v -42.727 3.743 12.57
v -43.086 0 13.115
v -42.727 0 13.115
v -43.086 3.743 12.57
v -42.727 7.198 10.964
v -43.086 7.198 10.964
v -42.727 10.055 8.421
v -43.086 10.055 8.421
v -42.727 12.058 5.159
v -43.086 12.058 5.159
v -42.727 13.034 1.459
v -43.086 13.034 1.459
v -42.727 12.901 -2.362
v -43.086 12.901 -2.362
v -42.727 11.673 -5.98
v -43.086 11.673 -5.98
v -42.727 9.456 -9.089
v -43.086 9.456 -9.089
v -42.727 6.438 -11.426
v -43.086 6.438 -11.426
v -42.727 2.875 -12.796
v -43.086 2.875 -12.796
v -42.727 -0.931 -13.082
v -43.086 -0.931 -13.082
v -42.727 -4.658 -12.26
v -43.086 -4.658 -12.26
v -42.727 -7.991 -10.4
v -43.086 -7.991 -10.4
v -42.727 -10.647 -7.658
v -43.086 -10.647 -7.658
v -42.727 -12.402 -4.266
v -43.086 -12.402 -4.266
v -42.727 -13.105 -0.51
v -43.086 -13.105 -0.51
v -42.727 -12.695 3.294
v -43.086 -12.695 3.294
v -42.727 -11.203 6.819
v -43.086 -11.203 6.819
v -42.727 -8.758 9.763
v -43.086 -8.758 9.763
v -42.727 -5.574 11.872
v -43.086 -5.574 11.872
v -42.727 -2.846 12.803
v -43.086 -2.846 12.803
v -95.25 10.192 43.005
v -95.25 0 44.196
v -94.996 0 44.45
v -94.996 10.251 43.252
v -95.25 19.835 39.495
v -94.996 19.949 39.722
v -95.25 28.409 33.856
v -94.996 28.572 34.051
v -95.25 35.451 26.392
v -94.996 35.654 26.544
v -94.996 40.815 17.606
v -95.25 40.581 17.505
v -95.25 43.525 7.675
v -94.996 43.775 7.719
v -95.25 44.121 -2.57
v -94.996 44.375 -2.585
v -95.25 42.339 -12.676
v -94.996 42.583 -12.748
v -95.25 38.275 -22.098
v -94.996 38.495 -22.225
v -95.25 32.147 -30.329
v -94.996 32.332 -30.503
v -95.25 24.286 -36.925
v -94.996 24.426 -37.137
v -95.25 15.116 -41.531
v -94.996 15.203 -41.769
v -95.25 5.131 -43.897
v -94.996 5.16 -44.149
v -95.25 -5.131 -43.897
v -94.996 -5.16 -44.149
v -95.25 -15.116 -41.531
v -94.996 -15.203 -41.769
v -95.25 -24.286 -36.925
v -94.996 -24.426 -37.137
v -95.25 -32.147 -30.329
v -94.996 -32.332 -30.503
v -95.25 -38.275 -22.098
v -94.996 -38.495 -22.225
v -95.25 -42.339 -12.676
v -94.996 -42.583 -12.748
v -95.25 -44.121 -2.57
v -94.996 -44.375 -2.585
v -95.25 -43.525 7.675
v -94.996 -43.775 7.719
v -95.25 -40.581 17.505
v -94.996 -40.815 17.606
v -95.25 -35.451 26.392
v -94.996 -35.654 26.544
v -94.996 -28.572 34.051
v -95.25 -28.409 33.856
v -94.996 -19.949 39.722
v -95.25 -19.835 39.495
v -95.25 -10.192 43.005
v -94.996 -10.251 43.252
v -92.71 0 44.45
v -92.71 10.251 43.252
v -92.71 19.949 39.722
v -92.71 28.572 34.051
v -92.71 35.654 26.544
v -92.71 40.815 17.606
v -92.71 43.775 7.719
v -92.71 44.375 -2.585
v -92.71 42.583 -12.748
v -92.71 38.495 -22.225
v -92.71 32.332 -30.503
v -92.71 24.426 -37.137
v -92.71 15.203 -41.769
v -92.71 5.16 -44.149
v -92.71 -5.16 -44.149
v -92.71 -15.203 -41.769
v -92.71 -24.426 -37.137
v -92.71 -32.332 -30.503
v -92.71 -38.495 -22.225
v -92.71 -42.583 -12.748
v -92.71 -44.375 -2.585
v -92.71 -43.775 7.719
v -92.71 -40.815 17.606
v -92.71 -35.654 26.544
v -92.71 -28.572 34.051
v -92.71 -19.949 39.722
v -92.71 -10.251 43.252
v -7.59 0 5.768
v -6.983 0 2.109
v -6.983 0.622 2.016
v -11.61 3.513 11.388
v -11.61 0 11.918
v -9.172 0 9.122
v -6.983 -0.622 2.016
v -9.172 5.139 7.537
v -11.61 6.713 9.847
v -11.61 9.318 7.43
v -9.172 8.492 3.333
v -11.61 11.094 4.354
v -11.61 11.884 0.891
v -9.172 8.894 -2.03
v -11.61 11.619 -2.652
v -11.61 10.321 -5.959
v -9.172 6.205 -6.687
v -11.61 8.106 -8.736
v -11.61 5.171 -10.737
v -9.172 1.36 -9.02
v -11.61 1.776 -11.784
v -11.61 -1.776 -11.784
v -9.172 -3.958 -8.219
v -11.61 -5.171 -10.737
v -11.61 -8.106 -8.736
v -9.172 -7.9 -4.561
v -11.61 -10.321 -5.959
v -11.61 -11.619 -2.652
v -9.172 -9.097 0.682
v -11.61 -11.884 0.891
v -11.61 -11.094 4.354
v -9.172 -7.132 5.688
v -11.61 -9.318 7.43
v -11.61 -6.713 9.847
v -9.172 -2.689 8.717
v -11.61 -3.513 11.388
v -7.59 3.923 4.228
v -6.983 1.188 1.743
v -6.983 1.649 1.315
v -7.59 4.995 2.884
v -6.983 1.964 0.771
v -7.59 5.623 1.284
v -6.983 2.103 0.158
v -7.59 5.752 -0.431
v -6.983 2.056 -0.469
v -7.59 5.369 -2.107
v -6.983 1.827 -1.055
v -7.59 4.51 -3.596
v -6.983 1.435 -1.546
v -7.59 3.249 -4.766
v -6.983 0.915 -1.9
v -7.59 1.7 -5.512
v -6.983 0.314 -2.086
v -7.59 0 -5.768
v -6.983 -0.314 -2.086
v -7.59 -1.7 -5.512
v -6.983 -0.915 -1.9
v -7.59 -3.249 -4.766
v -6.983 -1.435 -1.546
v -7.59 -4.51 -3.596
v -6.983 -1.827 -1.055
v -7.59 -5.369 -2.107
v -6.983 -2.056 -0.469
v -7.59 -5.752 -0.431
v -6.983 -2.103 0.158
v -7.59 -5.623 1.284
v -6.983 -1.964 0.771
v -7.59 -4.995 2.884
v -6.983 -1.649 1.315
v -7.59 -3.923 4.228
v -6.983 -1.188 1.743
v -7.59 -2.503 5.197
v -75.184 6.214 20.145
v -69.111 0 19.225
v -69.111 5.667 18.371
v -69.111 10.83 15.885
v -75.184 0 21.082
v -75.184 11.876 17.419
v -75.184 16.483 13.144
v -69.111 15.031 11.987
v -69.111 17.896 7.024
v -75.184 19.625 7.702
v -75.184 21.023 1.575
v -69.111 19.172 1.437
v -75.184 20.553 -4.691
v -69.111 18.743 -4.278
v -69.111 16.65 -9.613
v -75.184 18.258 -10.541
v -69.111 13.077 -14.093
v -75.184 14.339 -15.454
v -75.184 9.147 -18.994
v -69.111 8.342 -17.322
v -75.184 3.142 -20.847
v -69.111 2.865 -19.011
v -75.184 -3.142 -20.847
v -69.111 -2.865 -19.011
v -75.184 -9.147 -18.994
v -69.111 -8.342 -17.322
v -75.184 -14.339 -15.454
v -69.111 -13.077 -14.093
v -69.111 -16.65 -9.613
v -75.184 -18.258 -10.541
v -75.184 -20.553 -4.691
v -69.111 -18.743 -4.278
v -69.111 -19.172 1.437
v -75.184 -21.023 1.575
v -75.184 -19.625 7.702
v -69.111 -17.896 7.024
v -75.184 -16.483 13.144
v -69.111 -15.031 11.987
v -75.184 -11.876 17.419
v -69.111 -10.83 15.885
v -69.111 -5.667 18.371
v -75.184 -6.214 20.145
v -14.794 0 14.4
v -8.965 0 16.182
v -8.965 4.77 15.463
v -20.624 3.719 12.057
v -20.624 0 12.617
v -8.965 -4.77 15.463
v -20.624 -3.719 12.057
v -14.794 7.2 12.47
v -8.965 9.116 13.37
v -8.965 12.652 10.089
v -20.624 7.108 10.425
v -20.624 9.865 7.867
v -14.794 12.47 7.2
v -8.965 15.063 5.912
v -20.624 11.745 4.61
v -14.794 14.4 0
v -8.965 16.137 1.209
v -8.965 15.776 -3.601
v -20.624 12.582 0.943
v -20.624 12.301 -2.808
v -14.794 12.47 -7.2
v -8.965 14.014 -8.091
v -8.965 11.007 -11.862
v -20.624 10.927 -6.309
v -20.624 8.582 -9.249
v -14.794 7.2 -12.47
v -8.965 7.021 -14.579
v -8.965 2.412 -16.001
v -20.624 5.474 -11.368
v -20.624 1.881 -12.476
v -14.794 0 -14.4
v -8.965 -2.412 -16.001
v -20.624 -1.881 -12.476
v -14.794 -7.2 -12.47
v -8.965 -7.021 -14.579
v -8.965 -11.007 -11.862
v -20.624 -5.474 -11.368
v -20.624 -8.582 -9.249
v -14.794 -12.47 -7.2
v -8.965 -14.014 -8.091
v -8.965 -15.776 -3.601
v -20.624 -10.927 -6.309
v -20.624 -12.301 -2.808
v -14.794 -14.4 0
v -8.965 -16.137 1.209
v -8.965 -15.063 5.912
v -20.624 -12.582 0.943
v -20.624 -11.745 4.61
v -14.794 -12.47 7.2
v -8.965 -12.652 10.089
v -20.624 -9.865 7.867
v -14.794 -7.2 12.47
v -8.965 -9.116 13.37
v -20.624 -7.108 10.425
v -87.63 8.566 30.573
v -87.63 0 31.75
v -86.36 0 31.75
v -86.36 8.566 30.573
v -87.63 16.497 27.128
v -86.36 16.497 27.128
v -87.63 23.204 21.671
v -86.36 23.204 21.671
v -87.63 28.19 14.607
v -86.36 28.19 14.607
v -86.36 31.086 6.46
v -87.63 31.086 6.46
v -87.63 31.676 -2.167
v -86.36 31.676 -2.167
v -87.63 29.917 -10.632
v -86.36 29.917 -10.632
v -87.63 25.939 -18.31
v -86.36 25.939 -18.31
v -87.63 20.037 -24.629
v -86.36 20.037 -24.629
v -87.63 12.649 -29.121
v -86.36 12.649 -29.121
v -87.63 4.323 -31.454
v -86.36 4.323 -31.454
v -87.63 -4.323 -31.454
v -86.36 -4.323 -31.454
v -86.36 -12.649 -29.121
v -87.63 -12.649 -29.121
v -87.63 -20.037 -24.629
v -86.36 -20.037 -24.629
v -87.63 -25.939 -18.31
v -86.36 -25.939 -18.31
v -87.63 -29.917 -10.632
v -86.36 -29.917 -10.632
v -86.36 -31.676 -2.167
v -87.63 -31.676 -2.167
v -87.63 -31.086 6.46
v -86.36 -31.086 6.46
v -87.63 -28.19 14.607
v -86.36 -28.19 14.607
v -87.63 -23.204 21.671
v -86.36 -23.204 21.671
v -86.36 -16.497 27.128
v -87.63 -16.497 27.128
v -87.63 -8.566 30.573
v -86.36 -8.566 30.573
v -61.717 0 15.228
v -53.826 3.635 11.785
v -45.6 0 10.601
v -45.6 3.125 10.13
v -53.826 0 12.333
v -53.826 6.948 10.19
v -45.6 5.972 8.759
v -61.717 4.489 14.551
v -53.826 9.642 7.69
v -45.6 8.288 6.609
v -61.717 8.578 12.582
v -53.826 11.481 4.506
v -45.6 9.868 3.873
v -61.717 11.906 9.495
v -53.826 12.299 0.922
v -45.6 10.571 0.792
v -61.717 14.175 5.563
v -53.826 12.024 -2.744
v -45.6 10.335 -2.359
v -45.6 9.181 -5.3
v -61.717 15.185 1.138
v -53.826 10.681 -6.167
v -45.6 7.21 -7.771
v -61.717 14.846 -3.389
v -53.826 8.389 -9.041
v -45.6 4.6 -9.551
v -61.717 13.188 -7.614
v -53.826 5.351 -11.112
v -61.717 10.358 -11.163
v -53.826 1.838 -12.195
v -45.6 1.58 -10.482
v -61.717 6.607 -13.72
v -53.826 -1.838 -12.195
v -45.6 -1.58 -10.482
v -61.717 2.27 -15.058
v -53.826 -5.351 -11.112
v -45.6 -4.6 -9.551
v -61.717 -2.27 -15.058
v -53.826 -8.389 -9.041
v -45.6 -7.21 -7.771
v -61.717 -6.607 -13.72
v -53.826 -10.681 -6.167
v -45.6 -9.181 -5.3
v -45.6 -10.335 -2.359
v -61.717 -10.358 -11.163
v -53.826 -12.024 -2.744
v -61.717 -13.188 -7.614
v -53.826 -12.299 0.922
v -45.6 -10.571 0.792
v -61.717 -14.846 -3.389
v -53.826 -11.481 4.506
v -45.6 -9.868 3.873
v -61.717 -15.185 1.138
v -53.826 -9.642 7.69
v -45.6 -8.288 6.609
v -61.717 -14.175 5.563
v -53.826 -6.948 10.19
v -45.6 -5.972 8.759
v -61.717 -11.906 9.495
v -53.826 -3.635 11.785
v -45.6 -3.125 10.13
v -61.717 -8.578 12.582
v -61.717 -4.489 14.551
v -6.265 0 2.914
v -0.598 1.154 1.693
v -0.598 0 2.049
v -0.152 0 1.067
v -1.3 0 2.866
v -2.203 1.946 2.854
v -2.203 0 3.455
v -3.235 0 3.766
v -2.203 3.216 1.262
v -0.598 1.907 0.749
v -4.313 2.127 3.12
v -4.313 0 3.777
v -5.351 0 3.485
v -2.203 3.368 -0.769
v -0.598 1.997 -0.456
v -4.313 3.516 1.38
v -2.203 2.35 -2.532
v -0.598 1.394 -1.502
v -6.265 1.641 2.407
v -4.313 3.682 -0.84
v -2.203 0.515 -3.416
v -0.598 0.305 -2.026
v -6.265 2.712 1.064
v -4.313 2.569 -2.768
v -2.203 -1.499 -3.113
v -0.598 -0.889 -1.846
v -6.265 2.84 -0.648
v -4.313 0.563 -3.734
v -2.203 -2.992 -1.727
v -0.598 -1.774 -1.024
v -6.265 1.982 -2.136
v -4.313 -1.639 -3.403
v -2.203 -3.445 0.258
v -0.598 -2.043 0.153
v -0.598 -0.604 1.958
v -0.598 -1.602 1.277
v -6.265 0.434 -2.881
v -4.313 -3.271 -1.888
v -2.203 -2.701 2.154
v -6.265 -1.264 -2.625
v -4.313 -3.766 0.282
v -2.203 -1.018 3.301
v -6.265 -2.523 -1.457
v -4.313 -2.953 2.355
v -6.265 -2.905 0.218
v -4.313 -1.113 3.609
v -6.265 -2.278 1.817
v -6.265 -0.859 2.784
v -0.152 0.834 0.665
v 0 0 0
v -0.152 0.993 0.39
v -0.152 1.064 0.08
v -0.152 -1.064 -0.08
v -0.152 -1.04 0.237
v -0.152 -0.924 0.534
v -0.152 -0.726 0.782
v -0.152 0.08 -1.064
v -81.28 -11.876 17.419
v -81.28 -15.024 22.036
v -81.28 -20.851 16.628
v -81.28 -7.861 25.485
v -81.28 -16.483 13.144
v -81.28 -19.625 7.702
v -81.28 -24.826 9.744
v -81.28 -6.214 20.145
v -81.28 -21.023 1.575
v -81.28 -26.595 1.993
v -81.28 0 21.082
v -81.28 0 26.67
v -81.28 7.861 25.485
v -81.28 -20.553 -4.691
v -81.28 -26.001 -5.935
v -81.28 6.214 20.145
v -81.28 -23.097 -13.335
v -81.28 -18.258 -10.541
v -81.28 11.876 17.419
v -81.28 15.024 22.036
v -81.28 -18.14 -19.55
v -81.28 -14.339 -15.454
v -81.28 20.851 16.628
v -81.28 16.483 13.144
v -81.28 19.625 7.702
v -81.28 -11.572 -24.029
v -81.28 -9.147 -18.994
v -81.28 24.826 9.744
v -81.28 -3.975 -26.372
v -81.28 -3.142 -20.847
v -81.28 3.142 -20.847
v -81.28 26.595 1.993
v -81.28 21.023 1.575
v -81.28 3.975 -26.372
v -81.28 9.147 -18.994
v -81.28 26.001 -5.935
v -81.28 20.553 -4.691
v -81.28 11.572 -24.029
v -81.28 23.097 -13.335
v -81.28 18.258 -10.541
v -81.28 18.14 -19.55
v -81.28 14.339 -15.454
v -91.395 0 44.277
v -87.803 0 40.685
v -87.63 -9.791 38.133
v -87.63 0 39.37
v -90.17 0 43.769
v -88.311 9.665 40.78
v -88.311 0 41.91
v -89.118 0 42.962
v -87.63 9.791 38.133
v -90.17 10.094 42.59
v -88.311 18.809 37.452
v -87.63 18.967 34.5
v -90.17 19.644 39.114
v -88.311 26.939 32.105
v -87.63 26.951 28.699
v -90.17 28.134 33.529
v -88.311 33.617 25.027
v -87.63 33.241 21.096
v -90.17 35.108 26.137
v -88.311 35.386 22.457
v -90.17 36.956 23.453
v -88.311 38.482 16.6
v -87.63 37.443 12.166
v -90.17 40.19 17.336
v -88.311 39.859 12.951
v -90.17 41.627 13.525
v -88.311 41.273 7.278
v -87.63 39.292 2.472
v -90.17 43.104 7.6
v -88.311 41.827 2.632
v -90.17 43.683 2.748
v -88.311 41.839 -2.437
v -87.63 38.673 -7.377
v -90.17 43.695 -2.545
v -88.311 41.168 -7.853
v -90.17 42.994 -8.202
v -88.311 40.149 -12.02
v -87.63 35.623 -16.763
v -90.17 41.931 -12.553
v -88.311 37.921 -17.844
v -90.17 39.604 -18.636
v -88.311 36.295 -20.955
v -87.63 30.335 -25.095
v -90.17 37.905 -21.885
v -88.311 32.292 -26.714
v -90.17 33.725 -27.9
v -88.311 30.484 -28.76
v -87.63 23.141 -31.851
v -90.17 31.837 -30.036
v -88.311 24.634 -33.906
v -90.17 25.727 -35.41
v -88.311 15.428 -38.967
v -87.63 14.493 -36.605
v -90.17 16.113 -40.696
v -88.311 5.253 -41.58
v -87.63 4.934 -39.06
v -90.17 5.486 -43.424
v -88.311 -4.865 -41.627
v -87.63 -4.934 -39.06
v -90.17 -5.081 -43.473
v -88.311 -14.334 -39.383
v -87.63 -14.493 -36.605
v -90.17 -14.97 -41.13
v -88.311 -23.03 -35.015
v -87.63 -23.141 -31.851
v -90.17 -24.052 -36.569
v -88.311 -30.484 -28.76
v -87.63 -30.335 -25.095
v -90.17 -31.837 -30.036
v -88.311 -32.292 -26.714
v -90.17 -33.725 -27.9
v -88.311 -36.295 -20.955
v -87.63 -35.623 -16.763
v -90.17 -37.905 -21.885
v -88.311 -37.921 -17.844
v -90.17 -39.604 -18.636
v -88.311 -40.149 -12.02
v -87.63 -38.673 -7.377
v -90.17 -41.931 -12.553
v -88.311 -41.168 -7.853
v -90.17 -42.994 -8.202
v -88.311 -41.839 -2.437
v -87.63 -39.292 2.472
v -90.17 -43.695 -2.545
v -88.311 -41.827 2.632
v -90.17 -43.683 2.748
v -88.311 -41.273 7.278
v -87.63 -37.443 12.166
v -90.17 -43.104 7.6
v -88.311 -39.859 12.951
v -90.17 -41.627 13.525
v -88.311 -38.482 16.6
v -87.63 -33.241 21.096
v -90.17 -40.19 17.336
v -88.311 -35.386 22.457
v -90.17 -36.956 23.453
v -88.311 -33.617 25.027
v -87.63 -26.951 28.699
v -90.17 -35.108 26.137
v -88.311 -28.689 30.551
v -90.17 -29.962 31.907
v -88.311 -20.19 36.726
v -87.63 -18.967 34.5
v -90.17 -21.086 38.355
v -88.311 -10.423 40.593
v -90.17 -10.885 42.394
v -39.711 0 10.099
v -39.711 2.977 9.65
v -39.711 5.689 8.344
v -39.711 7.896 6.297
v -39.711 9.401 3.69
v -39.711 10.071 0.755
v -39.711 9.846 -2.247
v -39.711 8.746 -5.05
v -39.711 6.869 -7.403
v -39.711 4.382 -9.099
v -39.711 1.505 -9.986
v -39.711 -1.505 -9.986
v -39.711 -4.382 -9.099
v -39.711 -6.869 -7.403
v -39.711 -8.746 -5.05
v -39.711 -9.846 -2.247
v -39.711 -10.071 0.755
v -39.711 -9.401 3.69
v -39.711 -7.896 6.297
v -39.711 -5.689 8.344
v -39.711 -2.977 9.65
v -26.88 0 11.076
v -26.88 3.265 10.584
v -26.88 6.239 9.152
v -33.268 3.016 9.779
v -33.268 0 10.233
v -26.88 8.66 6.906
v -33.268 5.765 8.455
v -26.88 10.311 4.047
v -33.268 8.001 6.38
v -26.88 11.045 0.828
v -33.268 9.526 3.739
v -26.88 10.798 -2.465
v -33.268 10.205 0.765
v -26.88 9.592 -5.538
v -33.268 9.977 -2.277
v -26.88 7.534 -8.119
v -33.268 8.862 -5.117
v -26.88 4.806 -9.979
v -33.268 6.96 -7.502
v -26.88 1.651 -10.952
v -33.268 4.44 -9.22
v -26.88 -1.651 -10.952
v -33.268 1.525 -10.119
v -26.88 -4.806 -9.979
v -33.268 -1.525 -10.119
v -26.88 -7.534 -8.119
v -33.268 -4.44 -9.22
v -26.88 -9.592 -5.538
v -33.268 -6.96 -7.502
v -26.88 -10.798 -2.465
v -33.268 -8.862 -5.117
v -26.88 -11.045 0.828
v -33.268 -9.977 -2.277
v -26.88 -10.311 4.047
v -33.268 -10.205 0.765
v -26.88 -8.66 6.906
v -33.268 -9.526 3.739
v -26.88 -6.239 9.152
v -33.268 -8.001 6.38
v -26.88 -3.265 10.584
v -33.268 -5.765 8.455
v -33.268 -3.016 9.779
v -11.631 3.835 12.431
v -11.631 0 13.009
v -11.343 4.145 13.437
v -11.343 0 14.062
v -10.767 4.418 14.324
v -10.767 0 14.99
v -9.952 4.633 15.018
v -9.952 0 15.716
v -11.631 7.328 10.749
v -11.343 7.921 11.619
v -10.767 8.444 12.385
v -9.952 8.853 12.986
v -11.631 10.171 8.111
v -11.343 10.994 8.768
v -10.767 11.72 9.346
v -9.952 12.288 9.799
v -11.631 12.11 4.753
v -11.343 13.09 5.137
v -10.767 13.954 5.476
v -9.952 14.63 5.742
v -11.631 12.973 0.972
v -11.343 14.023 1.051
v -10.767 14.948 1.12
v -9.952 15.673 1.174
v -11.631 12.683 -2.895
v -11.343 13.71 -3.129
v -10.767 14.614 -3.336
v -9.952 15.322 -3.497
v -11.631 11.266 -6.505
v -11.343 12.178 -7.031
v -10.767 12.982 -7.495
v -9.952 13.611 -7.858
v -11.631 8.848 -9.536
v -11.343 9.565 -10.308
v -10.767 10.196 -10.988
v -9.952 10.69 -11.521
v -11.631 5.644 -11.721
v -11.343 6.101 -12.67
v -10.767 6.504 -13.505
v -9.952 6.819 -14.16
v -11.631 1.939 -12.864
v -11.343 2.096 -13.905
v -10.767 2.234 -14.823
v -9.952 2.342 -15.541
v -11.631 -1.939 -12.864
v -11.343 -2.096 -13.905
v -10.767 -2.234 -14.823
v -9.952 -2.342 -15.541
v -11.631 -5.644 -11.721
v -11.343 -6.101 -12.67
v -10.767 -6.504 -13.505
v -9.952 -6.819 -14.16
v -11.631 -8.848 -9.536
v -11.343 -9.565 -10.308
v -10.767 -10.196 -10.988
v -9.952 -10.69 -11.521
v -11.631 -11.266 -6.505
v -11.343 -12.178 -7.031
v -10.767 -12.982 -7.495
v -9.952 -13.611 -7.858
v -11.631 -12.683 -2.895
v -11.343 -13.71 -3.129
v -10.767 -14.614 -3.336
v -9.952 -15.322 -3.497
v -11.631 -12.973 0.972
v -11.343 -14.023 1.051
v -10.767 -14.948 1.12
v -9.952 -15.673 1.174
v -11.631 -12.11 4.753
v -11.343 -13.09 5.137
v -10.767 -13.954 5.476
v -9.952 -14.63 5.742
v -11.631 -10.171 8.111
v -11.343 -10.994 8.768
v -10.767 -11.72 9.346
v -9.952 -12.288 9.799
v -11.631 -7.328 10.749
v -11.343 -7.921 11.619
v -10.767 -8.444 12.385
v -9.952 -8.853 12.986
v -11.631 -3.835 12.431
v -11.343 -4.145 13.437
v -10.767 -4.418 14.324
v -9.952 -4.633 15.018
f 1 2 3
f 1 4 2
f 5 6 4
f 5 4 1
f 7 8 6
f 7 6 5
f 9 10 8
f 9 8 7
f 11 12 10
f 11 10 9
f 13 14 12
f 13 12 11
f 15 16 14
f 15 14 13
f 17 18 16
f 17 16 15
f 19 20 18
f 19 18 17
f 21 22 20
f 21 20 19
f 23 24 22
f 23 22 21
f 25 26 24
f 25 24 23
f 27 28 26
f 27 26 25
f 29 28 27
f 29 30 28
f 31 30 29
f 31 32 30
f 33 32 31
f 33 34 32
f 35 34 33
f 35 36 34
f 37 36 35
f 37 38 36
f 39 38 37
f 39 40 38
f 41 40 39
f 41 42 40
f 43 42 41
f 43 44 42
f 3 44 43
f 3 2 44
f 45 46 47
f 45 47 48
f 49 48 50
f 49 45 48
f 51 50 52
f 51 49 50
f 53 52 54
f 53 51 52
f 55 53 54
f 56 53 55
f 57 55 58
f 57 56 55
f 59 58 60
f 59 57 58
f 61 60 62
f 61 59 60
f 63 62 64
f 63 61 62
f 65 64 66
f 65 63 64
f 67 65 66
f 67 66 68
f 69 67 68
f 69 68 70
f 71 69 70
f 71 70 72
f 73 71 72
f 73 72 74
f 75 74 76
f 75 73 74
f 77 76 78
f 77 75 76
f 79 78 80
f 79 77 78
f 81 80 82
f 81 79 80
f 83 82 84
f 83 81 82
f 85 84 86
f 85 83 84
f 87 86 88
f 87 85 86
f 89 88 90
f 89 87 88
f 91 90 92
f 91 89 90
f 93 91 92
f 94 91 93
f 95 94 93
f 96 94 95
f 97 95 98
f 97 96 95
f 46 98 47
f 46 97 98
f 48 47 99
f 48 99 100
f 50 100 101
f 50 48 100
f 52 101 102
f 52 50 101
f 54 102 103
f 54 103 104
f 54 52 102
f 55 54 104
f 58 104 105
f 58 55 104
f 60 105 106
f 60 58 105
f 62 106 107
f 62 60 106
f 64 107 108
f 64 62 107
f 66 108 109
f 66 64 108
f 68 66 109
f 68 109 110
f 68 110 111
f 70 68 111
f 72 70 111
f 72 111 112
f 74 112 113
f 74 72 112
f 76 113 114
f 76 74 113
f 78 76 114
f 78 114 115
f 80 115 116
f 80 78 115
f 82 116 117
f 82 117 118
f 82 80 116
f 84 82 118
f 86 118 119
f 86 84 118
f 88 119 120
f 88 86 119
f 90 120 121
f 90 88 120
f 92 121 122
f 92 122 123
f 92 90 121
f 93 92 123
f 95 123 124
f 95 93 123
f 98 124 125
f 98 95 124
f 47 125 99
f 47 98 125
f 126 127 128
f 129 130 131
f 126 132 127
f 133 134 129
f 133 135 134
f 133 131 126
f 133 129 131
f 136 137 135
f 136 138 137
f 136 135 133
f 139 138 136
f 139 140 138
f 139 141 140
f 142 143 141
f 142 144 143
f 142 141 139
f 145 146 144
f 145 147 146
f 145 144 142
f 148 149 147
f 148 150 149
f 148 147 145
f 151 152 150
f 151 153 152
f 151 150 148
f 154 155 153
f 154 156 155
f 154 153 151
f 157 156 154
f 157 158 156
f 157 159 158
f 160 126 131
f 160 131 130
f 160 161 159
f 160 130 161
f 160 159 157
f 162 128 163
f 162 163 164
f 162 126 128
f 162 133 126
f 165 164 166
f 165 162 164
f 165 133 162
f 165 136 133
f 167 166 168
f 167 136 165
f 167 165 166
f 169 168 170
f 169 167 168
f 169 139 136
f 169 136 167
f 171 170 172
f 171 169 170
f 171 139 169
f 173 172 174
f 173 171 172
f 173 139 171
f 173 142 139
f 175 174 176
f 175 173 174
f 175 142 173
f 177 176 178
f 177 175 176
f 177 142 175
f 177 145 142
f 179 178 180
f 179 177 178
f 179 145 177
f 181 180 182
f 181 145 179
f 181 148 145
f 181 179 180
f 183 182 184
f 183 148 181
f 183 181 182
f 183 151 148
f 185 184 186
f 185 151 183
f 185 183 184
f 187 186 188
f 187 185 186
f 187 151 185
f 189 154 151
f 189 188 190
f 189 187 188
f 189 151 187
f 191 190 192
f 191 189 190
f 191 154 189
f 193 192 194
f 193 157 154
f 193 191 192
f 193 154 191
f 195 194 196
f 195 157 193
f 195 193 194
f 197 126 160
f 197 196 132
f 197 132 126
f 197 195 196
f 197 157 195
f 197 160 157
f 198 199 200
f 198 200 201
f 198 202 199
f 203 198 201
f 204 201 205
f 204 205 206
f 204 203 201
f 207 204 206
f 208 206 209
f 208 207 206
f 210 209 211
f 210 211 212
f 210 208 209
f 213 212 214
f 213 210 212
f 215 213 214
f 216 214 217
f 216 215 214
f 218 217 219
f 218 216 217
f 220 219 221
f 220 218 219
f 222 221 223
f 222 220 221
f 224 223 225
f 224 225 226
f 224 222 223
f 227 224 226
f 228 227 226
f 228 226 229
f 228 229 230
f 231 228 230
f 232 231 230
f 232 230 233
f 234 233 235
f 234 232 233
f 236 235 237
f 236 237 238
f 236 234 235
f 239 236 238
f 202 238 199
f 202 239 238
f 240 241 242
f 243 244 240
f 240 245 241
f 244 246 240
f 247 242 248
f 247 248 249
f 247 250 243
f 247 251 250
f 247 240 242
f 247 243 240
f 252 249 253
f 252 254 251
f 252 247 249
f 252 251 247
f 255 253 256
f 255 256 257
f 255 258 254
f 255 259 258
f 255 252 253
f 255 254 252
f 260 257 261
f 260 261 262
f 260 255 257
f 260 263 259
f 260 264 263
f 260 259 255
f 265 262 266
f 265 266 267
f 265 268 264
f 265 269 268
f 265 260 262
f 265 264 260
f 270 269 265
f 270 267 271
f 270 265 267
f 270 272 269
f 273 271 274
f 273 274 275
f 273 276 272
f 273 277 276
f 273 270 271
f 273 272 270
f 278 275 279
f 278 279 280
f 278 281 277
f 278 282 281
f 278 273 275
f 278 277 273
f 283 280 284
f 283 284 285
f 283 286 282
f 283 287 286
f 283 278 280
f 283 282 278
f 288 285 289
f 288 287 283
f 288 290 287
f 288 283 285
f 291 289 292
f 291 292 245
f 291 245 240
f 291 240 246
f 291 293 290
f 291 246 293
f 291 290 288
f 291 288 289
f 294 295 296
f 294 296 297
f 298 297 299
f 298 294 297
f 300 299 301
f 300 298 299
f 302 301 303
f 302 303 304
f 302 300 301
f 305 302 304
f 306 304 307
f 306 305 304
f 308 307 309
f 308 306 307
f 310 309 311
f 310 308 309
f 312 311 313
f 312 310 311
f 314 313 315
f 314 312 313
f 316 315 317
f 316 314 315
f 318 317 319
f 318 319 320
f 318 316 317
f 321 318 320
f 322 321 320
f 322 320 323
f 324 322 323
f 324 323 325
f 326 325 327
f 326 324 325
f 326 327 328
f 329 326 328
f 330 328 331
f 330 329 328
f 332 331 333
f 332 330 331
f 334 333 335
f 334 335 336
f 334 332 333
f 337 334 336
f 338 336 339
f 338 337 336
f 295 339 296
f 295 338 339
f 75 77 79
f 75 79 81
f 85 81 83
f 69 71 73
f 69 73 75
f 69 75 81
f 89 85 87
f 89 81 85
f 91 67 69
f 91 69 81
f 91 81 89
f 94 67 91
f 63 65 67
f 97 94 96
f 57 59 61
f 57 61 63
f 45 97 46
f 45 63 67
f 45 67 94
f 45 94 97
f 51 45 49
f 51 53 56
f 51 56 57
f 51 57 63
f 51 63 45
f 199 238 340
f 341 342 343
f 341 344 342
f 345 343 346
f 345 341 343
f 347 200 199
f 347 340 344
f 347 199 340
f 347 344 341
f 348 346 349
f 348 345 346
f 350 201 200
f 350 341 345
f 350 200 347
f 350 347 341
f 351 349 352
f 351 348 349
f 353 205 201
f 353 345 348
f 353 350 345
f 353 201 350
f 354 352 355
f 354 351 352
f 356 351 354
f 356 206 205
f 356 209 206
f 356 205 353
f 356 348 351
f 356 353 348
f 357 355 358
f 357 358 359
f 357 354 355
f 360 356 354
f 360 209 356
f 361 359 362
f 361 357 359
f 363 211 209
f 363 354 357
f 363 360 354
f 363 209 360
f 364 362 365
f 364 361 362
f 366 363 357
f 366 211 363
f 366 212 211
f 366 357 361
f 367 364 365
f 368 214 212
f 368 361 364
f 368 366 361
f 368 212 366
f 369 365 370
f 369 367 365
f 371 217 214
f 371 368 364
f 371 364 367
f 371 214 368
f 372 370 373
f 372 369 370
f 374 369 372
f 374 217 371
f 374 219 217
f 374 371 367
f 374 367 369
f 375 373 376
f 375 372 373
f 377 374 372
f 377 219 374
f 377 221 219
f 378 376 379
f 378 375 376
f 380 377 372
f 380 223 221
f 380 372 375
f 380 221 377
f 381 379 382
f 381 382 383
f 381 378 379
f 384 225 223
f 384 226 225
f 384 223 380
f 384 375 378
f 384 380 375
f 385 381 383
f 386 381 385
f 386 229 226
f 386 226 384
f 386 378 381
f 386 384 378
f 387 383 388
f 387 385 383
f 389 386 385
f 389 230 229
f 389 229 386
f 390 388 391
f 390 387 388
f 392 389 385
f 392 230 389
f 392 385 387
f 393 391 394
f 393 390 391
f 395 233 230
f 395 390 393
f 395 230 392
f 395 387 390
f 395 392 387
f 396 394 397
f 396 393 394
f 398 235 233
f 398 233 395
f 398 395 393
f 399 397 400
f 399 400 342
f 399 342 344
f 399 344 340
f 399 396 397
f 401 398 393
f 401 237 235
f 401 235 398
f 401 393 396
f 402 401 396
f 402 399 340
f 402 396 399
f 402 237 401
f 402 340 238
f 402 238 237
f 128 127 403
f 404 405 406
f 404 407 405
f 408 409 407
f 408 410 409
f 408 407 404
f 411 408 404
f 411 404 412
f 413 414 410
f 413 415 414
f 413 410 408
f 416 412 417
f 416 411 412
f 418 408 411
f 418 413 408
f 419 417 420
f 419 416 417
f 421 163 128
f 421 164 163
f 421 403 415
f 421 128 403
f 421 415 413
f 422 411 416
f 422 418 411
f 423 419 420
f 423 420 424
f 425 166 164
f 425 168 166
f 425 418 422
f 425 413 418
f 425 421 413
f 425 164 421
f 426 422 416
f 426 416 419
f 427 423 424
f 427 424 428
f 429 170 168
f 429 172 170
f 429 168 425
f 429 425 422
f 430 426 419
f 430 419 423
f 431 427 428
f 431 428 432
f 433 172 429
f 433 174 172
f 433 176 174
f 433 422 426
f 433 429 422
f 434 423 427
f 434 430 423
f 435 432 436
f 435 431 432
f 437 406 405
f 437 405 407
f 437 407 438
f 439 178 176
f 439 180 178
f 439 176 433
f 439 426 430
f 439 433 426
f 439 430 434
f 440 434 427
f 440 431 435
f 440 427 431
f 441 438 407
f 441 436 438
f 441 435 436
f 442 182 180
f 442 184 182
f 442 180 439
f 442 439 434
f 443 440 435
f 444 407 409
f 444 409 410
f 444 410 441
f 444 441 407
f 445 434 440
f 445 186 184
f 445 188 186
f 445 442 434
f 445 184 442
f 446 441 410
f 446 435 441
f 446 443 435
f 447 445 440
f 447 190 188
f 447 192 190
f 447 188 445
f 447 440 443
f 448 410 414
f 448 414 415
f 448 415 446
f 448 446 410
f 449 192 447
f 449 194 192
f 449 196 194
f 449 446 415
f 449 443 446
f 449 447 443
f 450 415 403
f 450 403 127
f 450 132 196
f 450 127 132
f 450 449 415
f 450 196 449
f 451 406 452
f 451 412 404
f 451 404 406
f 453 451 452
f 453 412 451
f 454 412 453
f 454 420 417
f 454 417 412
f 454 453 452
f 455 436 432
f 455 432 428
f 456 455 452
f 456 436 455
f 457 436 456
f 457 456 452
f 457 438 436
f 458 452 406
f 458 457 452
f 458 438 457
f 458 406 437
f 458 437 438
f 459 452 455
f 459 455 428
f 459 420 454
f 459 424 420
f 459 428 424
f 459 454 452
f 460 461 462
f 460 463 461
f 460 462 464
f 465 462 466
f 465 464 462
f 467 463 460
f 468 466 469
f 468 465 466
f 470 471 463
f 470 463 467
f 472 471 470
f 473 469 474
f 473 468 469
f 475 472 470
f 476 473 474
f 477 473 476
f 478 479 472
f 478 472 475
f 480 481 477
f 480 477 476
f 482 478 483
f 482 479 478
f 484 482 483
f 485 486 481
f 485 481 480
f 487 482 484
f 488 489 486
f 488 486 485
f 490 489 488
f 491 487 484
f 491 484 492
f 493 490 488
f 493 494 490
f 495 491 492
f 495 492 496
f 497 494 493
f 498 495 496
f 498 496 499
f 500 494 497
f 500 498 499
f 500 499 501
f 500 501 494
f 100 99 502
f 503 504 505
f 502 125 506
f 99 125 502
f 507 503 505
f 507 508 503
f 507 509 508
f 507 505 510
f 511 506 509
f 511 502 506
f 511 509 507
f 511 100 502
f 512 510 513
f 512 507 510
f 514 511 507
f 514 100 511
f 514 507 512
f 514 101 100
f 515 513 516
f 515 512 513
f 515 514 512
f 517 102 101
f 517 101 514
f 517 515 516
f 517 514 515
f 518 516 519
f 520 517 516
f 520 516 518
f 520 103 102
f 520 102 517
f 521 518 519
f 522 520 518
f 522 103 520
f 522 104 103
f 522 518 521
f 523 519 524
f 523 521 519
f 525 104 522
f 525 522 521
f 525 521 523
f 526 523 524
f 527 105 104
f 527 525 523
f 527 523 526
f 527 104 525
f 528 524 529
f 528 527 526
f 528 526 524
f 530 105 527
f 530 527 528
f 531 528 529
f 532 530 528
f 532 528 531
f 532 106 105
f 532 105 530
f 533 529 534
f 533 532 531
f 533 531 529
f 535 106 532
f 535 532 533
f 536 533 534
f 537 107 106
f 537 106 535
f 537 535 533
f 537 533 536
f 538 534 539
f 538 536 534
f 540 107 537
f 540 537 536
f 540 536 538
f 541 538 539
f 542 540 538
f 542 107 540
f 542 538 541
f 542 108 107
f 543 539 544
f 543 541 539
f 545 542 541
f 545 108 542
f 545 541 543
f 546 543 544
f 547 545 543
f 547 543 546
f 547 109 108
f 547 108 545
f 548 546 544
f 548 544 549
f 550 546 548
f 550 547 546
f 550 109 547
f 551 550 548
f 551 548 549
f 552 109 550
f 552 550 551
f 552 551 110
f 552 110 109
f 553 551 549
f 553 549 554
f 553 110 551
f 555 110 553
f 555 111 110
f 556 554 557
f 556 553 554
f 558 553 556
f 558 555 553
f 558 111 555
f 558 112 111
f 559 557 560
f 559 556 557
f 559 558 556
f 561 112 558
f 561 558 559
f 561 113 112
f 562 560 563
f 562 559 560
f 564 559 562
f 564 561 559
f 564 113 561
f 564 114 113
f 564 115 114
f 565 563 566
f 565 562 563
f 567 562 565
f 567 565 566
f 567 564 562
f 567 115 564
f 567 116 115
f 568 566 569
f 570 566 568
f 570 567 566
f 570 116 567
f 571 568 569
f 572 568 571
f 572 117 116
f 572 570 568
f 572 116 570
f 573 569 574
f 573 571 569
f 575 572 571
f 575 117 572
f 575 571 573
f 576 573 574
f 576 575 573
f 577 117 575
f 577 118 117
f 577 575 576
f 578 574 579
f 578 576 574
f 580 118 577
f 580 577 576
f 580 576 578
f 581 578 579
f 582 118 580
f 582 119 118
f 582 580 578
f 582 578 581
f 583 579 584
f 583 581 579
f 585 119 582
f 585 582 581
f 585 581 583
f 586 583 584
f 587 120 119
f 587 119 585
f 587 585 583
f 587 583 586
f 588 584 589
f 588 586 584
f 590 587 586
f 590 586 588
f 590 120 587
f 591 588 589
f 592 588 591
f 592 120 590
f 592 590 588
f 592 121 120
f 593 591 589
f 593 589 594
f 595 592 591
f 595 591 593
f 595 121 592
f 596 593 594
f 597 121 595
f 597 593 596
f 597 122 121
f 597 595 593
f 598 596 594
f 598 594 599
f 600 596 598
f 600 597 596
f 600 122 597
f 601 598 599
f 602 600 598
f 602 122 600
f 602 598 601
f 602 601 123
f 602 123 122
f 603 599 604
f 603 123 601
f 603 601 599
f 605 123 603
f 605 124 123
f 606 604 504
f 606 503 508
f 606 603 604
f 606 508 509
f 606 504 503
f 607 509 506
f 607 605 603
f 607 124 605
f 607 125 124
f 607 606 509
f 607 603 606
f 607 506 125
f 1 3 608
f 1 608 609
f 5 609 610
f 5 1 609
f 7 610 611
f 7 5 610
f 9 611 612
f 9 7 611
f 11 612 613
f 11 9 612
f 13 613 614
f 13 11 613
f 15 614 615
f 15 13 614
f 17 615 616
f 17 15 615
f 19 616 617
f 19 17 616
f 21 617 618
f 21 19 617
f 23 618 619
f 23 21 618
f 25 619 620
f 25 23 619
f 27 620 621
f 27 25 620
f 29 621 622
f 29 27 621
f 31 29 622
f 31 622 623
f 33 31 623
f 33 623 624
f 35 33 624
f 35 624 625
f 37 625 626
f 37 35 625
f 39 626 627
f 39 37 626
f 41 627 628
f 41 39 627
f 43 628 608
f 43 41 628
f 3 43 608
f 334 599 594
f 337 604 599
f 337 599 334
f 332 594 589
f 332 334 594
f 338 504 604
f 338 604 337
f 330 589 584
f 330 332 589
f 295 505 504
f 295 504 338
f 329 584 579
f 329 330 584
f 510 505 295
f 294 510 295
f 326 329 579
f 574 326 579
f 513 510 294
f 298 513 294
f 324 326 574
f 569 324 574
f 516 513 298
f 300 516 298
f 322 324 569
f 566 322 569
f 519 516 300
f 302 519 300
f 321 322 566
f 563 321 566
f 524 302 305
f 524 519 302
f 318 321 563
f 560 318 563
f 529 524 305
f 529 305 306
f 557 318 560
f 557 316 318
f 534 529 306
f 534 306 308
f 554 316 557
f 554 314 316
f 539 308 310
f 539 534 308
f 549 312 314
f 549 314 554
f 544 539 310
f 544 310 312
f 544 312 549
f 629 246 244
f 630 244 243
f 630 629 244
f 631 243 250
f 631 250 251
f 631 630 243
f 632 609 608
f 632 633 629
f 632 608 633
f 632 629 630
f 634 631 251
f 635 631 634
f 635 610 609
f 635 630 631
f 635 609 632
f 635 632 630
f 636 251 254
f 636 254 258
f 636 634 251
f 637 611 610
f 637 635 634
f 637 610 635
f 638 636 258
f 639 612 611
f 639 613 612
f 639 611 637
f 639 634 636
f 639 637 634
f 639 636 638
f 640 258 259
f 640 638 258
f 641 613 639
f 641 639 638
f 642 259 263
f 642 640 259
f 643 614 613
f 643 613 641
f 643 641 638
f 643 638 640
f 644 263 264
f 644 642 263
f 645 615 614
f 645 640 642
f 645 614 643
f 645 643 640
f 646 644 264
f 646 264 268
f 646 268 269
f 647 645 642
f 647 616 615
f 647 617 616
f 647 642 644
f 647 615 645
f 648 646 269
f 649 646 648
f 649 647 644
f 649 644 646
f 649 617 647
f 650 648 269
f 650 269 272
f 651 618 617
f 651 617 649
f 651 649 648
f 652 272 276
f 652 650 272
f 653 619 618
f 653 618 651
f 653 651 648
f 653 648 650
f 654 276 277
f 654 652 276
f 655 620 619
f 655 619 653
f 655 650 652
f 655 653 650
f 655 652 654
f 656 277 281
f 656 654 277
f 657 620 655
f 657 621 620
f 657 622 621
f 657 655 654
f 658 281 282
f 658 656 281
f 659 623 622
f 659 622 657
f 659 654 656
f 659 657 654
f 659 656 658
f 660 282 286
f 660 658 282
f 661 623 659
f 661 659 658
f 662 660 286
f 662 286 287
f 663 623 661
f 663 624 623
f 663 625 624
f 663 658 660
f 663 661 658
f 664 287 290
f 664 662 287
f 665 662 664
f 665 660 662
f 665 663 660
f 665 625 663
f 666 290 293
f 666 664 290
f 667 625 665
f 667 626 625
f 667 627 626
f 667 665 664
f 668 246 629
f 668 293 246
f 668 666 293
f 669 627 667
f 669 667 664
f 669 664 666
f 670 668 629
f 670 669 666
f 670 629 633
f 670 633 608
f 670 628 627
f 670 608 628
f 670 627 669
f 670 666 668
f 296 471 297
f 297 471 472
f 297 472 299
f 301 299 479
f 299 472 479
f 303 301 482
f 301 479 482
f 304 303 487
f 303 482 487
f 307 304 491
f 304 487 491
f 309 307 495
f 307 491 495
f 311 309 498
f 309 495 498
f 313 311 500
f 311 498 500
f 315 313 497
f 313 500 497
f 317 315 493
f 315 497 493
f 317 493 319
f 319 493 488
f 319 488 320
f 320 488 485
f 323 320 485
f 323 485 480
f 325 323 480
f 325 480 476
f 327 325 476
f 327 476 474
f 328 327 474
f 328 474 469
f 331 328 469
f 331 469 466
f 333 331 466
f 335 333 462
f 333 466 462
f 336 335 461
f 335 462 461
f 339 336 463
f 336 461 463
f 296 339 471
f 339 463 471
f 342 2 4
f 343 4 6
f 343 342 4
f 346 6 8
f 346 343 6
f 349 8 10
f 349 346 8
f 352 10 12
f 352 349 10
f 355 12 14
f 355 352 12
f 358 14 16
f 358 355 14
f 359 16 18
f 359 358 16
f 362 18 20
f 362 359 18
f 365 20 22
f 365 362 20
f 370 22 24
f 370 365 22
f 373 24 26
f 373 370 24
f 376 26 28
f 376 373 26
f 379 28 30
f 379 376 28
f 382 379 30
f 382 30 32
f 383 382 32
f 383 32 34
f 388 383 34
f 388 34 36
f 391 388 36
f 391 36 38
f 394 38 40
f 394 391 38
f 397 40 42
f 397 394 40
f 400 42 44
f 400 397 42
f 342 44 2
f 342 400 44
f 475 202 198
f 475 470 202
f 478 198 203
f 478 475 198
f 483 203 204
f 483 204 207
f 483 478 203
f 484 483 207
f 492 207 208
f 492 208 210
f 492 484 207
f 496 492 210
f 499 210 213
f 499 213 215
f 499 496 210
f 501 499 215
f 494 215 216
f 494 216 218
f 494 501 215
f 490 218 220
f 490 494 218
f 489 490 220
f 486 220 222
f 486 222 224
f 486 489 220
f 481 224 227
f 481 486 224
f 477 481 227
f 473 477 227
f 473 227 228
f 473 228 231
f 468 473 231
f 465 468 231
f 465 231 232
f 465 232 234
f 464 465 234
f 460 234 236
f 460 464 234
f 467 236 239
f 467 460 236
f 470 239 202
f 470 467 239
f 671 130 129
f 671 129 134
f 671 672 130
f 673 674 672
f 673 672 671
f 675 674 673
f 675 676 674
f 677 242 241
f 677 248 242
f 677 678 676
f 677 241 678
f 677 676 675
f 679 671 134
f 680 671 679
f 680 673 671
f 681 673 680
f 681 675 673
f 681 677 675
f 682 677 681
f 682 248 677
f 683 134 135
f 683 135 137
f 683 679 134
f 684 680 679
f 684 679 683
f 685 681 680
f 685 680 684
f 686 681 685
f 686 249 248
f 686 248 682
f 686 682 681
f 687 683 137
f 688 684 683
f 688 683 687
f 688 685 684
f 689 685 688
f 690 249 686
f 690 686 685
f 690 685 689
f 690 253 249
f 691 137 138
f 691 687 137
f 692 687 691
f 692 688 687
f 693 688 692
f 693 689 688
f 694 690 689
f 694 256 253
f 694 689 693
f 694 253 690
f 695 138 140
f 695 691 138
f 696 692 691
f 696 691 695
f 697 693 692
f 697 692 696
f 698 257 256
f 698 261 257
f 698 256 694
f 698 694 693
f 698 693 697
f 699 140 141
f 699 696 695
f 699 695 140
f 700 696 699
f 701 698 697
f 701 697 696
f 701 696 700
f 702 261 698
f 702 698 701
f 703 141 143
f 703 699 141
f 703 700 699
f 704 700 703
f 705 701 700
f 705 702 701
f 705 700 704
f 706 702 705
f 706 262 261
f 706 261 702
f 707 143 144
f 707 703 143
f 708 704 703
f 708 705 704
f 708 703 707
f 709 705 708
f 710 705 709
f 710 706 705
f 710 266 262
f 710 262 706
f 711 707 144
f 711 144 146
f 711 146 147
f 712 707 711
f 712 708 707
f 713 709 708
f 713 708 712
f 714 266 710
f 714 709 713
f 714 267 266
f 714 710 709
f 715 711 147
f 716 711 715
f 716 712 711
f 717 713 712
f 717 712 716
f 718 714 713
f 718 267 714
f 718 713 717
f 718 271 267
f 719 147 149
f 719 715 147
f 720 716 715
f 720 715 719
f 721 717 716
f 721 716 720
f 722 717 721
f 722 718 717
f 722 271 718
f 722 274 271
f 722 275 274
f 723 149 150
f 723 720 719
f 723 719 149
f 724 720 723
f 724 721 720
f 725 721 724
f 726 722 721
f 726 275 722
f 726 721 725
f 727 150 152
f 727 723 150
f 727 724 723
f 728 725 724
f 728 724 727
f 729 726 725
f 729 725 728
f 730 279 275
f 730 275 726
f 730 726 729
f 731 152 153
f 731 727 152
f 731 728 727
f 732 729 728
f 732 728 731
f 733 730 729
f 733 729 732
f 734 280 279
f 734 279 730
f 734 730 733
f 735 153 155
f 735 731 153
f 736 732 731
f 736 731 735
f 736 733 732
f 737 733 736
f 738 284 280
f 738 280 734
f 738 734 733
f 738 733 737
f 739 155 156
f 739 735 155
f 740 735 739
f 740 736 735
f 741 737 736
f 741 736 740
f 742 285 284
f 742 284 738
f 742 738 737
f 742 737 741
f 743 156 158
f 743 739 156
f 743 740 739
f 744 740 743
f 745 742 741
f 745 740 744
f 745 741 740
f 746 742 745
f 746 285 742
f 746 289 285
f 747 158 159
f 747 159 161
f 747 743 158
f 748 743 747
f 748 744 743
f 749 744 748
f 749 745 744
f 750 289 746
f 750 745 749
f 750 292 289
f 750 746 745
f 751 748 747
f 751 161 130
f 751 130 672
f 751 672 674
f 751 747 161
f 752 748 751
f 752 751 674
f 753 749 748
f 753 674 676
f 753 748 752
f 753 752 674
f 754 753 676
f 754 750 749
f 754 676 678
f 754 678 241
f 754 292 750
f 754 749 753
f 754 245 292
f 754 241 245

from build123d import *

# Parameters (mm, degrees)
F2_R    = 5.08
F3_SIZE = 5.08
F4_SIZE = 0.254


with BuildPart() as f1:
    # F0 (on Front) → F1 (revolve)
    with BuildSketch(Plane.XZ):
        with BuildLine():
            Line((-95.25, 0), (0, 0))
            ThreePointArc((0, 0), (-2.708279, 3.647233), (-6.98284, 2.109309))
            ThreePointArc((-6.98284, 2.109309), (-8.264886, 7.499956), (-11.609642, 11.917572))
            ThreePointArc((-11.609642, 11.917572), (-11.088297, 14.546759), (-8.96451, 16.181984))
            Line((-8.96451, 16.181984), (-20.623778, 12.617388))
            ThreePointArc((-20.623778, 12.617388), (-30.0627, 10.566624), (-39.710517, 10.099176))
            Line((-39.710517, 10.099176), (-42.90622, 13.294879))
            Line((-42.90622, 13.294879), (-45.600297, 10.600802))
            ThreePointArc((-45.600297, 10.600802), (-57.823459, 13.638481), (-69.111465, 19.22544))
            Line((-69.111465, 19.22544), (-75.184, 21.082))
            Line((-75.184, 21.082), (-81.28, 21.082))
            Line((-81.28, 21.082), (-81.28, 31.75))
            Line((-81.28, 31.75), (-87.63, 31.75))
            Line((-87.63, 31.75), (-87.63, 44.45))
            Line((-87.63, 44.45), (-95.25, 44.45))
            Line((-95.25, 44.45), (-95.25, 0))
        make_face()
    revolve(axis=Axis((-47.625, 0, 0), (-1, 0, 0)))

    # F2
    f2_edges = [f1.edges().sort_by_distance(p)[0] for p in [
        (-87.63, 0, -44.45),
    ]]
    fillet(f2_edges, radius=F2_R)

    # F3
    f3_edges = [f1.edges().sort_by_distance(p)[0] for p in [
        (-81.28, 0, -31.75),
    ]]
    chamfer(f3_edges, length=F3_SIZE)

    # F4
    f4_edges = [f1.edges().sort_by_distance(p)[0] for p in [
        (-95.25, 0, -44.45),
        (-42.90622, 0, -13.294879),
    ]]
    chamfer(f4_edges, length=F4_SIZE)


solid = f1.part
